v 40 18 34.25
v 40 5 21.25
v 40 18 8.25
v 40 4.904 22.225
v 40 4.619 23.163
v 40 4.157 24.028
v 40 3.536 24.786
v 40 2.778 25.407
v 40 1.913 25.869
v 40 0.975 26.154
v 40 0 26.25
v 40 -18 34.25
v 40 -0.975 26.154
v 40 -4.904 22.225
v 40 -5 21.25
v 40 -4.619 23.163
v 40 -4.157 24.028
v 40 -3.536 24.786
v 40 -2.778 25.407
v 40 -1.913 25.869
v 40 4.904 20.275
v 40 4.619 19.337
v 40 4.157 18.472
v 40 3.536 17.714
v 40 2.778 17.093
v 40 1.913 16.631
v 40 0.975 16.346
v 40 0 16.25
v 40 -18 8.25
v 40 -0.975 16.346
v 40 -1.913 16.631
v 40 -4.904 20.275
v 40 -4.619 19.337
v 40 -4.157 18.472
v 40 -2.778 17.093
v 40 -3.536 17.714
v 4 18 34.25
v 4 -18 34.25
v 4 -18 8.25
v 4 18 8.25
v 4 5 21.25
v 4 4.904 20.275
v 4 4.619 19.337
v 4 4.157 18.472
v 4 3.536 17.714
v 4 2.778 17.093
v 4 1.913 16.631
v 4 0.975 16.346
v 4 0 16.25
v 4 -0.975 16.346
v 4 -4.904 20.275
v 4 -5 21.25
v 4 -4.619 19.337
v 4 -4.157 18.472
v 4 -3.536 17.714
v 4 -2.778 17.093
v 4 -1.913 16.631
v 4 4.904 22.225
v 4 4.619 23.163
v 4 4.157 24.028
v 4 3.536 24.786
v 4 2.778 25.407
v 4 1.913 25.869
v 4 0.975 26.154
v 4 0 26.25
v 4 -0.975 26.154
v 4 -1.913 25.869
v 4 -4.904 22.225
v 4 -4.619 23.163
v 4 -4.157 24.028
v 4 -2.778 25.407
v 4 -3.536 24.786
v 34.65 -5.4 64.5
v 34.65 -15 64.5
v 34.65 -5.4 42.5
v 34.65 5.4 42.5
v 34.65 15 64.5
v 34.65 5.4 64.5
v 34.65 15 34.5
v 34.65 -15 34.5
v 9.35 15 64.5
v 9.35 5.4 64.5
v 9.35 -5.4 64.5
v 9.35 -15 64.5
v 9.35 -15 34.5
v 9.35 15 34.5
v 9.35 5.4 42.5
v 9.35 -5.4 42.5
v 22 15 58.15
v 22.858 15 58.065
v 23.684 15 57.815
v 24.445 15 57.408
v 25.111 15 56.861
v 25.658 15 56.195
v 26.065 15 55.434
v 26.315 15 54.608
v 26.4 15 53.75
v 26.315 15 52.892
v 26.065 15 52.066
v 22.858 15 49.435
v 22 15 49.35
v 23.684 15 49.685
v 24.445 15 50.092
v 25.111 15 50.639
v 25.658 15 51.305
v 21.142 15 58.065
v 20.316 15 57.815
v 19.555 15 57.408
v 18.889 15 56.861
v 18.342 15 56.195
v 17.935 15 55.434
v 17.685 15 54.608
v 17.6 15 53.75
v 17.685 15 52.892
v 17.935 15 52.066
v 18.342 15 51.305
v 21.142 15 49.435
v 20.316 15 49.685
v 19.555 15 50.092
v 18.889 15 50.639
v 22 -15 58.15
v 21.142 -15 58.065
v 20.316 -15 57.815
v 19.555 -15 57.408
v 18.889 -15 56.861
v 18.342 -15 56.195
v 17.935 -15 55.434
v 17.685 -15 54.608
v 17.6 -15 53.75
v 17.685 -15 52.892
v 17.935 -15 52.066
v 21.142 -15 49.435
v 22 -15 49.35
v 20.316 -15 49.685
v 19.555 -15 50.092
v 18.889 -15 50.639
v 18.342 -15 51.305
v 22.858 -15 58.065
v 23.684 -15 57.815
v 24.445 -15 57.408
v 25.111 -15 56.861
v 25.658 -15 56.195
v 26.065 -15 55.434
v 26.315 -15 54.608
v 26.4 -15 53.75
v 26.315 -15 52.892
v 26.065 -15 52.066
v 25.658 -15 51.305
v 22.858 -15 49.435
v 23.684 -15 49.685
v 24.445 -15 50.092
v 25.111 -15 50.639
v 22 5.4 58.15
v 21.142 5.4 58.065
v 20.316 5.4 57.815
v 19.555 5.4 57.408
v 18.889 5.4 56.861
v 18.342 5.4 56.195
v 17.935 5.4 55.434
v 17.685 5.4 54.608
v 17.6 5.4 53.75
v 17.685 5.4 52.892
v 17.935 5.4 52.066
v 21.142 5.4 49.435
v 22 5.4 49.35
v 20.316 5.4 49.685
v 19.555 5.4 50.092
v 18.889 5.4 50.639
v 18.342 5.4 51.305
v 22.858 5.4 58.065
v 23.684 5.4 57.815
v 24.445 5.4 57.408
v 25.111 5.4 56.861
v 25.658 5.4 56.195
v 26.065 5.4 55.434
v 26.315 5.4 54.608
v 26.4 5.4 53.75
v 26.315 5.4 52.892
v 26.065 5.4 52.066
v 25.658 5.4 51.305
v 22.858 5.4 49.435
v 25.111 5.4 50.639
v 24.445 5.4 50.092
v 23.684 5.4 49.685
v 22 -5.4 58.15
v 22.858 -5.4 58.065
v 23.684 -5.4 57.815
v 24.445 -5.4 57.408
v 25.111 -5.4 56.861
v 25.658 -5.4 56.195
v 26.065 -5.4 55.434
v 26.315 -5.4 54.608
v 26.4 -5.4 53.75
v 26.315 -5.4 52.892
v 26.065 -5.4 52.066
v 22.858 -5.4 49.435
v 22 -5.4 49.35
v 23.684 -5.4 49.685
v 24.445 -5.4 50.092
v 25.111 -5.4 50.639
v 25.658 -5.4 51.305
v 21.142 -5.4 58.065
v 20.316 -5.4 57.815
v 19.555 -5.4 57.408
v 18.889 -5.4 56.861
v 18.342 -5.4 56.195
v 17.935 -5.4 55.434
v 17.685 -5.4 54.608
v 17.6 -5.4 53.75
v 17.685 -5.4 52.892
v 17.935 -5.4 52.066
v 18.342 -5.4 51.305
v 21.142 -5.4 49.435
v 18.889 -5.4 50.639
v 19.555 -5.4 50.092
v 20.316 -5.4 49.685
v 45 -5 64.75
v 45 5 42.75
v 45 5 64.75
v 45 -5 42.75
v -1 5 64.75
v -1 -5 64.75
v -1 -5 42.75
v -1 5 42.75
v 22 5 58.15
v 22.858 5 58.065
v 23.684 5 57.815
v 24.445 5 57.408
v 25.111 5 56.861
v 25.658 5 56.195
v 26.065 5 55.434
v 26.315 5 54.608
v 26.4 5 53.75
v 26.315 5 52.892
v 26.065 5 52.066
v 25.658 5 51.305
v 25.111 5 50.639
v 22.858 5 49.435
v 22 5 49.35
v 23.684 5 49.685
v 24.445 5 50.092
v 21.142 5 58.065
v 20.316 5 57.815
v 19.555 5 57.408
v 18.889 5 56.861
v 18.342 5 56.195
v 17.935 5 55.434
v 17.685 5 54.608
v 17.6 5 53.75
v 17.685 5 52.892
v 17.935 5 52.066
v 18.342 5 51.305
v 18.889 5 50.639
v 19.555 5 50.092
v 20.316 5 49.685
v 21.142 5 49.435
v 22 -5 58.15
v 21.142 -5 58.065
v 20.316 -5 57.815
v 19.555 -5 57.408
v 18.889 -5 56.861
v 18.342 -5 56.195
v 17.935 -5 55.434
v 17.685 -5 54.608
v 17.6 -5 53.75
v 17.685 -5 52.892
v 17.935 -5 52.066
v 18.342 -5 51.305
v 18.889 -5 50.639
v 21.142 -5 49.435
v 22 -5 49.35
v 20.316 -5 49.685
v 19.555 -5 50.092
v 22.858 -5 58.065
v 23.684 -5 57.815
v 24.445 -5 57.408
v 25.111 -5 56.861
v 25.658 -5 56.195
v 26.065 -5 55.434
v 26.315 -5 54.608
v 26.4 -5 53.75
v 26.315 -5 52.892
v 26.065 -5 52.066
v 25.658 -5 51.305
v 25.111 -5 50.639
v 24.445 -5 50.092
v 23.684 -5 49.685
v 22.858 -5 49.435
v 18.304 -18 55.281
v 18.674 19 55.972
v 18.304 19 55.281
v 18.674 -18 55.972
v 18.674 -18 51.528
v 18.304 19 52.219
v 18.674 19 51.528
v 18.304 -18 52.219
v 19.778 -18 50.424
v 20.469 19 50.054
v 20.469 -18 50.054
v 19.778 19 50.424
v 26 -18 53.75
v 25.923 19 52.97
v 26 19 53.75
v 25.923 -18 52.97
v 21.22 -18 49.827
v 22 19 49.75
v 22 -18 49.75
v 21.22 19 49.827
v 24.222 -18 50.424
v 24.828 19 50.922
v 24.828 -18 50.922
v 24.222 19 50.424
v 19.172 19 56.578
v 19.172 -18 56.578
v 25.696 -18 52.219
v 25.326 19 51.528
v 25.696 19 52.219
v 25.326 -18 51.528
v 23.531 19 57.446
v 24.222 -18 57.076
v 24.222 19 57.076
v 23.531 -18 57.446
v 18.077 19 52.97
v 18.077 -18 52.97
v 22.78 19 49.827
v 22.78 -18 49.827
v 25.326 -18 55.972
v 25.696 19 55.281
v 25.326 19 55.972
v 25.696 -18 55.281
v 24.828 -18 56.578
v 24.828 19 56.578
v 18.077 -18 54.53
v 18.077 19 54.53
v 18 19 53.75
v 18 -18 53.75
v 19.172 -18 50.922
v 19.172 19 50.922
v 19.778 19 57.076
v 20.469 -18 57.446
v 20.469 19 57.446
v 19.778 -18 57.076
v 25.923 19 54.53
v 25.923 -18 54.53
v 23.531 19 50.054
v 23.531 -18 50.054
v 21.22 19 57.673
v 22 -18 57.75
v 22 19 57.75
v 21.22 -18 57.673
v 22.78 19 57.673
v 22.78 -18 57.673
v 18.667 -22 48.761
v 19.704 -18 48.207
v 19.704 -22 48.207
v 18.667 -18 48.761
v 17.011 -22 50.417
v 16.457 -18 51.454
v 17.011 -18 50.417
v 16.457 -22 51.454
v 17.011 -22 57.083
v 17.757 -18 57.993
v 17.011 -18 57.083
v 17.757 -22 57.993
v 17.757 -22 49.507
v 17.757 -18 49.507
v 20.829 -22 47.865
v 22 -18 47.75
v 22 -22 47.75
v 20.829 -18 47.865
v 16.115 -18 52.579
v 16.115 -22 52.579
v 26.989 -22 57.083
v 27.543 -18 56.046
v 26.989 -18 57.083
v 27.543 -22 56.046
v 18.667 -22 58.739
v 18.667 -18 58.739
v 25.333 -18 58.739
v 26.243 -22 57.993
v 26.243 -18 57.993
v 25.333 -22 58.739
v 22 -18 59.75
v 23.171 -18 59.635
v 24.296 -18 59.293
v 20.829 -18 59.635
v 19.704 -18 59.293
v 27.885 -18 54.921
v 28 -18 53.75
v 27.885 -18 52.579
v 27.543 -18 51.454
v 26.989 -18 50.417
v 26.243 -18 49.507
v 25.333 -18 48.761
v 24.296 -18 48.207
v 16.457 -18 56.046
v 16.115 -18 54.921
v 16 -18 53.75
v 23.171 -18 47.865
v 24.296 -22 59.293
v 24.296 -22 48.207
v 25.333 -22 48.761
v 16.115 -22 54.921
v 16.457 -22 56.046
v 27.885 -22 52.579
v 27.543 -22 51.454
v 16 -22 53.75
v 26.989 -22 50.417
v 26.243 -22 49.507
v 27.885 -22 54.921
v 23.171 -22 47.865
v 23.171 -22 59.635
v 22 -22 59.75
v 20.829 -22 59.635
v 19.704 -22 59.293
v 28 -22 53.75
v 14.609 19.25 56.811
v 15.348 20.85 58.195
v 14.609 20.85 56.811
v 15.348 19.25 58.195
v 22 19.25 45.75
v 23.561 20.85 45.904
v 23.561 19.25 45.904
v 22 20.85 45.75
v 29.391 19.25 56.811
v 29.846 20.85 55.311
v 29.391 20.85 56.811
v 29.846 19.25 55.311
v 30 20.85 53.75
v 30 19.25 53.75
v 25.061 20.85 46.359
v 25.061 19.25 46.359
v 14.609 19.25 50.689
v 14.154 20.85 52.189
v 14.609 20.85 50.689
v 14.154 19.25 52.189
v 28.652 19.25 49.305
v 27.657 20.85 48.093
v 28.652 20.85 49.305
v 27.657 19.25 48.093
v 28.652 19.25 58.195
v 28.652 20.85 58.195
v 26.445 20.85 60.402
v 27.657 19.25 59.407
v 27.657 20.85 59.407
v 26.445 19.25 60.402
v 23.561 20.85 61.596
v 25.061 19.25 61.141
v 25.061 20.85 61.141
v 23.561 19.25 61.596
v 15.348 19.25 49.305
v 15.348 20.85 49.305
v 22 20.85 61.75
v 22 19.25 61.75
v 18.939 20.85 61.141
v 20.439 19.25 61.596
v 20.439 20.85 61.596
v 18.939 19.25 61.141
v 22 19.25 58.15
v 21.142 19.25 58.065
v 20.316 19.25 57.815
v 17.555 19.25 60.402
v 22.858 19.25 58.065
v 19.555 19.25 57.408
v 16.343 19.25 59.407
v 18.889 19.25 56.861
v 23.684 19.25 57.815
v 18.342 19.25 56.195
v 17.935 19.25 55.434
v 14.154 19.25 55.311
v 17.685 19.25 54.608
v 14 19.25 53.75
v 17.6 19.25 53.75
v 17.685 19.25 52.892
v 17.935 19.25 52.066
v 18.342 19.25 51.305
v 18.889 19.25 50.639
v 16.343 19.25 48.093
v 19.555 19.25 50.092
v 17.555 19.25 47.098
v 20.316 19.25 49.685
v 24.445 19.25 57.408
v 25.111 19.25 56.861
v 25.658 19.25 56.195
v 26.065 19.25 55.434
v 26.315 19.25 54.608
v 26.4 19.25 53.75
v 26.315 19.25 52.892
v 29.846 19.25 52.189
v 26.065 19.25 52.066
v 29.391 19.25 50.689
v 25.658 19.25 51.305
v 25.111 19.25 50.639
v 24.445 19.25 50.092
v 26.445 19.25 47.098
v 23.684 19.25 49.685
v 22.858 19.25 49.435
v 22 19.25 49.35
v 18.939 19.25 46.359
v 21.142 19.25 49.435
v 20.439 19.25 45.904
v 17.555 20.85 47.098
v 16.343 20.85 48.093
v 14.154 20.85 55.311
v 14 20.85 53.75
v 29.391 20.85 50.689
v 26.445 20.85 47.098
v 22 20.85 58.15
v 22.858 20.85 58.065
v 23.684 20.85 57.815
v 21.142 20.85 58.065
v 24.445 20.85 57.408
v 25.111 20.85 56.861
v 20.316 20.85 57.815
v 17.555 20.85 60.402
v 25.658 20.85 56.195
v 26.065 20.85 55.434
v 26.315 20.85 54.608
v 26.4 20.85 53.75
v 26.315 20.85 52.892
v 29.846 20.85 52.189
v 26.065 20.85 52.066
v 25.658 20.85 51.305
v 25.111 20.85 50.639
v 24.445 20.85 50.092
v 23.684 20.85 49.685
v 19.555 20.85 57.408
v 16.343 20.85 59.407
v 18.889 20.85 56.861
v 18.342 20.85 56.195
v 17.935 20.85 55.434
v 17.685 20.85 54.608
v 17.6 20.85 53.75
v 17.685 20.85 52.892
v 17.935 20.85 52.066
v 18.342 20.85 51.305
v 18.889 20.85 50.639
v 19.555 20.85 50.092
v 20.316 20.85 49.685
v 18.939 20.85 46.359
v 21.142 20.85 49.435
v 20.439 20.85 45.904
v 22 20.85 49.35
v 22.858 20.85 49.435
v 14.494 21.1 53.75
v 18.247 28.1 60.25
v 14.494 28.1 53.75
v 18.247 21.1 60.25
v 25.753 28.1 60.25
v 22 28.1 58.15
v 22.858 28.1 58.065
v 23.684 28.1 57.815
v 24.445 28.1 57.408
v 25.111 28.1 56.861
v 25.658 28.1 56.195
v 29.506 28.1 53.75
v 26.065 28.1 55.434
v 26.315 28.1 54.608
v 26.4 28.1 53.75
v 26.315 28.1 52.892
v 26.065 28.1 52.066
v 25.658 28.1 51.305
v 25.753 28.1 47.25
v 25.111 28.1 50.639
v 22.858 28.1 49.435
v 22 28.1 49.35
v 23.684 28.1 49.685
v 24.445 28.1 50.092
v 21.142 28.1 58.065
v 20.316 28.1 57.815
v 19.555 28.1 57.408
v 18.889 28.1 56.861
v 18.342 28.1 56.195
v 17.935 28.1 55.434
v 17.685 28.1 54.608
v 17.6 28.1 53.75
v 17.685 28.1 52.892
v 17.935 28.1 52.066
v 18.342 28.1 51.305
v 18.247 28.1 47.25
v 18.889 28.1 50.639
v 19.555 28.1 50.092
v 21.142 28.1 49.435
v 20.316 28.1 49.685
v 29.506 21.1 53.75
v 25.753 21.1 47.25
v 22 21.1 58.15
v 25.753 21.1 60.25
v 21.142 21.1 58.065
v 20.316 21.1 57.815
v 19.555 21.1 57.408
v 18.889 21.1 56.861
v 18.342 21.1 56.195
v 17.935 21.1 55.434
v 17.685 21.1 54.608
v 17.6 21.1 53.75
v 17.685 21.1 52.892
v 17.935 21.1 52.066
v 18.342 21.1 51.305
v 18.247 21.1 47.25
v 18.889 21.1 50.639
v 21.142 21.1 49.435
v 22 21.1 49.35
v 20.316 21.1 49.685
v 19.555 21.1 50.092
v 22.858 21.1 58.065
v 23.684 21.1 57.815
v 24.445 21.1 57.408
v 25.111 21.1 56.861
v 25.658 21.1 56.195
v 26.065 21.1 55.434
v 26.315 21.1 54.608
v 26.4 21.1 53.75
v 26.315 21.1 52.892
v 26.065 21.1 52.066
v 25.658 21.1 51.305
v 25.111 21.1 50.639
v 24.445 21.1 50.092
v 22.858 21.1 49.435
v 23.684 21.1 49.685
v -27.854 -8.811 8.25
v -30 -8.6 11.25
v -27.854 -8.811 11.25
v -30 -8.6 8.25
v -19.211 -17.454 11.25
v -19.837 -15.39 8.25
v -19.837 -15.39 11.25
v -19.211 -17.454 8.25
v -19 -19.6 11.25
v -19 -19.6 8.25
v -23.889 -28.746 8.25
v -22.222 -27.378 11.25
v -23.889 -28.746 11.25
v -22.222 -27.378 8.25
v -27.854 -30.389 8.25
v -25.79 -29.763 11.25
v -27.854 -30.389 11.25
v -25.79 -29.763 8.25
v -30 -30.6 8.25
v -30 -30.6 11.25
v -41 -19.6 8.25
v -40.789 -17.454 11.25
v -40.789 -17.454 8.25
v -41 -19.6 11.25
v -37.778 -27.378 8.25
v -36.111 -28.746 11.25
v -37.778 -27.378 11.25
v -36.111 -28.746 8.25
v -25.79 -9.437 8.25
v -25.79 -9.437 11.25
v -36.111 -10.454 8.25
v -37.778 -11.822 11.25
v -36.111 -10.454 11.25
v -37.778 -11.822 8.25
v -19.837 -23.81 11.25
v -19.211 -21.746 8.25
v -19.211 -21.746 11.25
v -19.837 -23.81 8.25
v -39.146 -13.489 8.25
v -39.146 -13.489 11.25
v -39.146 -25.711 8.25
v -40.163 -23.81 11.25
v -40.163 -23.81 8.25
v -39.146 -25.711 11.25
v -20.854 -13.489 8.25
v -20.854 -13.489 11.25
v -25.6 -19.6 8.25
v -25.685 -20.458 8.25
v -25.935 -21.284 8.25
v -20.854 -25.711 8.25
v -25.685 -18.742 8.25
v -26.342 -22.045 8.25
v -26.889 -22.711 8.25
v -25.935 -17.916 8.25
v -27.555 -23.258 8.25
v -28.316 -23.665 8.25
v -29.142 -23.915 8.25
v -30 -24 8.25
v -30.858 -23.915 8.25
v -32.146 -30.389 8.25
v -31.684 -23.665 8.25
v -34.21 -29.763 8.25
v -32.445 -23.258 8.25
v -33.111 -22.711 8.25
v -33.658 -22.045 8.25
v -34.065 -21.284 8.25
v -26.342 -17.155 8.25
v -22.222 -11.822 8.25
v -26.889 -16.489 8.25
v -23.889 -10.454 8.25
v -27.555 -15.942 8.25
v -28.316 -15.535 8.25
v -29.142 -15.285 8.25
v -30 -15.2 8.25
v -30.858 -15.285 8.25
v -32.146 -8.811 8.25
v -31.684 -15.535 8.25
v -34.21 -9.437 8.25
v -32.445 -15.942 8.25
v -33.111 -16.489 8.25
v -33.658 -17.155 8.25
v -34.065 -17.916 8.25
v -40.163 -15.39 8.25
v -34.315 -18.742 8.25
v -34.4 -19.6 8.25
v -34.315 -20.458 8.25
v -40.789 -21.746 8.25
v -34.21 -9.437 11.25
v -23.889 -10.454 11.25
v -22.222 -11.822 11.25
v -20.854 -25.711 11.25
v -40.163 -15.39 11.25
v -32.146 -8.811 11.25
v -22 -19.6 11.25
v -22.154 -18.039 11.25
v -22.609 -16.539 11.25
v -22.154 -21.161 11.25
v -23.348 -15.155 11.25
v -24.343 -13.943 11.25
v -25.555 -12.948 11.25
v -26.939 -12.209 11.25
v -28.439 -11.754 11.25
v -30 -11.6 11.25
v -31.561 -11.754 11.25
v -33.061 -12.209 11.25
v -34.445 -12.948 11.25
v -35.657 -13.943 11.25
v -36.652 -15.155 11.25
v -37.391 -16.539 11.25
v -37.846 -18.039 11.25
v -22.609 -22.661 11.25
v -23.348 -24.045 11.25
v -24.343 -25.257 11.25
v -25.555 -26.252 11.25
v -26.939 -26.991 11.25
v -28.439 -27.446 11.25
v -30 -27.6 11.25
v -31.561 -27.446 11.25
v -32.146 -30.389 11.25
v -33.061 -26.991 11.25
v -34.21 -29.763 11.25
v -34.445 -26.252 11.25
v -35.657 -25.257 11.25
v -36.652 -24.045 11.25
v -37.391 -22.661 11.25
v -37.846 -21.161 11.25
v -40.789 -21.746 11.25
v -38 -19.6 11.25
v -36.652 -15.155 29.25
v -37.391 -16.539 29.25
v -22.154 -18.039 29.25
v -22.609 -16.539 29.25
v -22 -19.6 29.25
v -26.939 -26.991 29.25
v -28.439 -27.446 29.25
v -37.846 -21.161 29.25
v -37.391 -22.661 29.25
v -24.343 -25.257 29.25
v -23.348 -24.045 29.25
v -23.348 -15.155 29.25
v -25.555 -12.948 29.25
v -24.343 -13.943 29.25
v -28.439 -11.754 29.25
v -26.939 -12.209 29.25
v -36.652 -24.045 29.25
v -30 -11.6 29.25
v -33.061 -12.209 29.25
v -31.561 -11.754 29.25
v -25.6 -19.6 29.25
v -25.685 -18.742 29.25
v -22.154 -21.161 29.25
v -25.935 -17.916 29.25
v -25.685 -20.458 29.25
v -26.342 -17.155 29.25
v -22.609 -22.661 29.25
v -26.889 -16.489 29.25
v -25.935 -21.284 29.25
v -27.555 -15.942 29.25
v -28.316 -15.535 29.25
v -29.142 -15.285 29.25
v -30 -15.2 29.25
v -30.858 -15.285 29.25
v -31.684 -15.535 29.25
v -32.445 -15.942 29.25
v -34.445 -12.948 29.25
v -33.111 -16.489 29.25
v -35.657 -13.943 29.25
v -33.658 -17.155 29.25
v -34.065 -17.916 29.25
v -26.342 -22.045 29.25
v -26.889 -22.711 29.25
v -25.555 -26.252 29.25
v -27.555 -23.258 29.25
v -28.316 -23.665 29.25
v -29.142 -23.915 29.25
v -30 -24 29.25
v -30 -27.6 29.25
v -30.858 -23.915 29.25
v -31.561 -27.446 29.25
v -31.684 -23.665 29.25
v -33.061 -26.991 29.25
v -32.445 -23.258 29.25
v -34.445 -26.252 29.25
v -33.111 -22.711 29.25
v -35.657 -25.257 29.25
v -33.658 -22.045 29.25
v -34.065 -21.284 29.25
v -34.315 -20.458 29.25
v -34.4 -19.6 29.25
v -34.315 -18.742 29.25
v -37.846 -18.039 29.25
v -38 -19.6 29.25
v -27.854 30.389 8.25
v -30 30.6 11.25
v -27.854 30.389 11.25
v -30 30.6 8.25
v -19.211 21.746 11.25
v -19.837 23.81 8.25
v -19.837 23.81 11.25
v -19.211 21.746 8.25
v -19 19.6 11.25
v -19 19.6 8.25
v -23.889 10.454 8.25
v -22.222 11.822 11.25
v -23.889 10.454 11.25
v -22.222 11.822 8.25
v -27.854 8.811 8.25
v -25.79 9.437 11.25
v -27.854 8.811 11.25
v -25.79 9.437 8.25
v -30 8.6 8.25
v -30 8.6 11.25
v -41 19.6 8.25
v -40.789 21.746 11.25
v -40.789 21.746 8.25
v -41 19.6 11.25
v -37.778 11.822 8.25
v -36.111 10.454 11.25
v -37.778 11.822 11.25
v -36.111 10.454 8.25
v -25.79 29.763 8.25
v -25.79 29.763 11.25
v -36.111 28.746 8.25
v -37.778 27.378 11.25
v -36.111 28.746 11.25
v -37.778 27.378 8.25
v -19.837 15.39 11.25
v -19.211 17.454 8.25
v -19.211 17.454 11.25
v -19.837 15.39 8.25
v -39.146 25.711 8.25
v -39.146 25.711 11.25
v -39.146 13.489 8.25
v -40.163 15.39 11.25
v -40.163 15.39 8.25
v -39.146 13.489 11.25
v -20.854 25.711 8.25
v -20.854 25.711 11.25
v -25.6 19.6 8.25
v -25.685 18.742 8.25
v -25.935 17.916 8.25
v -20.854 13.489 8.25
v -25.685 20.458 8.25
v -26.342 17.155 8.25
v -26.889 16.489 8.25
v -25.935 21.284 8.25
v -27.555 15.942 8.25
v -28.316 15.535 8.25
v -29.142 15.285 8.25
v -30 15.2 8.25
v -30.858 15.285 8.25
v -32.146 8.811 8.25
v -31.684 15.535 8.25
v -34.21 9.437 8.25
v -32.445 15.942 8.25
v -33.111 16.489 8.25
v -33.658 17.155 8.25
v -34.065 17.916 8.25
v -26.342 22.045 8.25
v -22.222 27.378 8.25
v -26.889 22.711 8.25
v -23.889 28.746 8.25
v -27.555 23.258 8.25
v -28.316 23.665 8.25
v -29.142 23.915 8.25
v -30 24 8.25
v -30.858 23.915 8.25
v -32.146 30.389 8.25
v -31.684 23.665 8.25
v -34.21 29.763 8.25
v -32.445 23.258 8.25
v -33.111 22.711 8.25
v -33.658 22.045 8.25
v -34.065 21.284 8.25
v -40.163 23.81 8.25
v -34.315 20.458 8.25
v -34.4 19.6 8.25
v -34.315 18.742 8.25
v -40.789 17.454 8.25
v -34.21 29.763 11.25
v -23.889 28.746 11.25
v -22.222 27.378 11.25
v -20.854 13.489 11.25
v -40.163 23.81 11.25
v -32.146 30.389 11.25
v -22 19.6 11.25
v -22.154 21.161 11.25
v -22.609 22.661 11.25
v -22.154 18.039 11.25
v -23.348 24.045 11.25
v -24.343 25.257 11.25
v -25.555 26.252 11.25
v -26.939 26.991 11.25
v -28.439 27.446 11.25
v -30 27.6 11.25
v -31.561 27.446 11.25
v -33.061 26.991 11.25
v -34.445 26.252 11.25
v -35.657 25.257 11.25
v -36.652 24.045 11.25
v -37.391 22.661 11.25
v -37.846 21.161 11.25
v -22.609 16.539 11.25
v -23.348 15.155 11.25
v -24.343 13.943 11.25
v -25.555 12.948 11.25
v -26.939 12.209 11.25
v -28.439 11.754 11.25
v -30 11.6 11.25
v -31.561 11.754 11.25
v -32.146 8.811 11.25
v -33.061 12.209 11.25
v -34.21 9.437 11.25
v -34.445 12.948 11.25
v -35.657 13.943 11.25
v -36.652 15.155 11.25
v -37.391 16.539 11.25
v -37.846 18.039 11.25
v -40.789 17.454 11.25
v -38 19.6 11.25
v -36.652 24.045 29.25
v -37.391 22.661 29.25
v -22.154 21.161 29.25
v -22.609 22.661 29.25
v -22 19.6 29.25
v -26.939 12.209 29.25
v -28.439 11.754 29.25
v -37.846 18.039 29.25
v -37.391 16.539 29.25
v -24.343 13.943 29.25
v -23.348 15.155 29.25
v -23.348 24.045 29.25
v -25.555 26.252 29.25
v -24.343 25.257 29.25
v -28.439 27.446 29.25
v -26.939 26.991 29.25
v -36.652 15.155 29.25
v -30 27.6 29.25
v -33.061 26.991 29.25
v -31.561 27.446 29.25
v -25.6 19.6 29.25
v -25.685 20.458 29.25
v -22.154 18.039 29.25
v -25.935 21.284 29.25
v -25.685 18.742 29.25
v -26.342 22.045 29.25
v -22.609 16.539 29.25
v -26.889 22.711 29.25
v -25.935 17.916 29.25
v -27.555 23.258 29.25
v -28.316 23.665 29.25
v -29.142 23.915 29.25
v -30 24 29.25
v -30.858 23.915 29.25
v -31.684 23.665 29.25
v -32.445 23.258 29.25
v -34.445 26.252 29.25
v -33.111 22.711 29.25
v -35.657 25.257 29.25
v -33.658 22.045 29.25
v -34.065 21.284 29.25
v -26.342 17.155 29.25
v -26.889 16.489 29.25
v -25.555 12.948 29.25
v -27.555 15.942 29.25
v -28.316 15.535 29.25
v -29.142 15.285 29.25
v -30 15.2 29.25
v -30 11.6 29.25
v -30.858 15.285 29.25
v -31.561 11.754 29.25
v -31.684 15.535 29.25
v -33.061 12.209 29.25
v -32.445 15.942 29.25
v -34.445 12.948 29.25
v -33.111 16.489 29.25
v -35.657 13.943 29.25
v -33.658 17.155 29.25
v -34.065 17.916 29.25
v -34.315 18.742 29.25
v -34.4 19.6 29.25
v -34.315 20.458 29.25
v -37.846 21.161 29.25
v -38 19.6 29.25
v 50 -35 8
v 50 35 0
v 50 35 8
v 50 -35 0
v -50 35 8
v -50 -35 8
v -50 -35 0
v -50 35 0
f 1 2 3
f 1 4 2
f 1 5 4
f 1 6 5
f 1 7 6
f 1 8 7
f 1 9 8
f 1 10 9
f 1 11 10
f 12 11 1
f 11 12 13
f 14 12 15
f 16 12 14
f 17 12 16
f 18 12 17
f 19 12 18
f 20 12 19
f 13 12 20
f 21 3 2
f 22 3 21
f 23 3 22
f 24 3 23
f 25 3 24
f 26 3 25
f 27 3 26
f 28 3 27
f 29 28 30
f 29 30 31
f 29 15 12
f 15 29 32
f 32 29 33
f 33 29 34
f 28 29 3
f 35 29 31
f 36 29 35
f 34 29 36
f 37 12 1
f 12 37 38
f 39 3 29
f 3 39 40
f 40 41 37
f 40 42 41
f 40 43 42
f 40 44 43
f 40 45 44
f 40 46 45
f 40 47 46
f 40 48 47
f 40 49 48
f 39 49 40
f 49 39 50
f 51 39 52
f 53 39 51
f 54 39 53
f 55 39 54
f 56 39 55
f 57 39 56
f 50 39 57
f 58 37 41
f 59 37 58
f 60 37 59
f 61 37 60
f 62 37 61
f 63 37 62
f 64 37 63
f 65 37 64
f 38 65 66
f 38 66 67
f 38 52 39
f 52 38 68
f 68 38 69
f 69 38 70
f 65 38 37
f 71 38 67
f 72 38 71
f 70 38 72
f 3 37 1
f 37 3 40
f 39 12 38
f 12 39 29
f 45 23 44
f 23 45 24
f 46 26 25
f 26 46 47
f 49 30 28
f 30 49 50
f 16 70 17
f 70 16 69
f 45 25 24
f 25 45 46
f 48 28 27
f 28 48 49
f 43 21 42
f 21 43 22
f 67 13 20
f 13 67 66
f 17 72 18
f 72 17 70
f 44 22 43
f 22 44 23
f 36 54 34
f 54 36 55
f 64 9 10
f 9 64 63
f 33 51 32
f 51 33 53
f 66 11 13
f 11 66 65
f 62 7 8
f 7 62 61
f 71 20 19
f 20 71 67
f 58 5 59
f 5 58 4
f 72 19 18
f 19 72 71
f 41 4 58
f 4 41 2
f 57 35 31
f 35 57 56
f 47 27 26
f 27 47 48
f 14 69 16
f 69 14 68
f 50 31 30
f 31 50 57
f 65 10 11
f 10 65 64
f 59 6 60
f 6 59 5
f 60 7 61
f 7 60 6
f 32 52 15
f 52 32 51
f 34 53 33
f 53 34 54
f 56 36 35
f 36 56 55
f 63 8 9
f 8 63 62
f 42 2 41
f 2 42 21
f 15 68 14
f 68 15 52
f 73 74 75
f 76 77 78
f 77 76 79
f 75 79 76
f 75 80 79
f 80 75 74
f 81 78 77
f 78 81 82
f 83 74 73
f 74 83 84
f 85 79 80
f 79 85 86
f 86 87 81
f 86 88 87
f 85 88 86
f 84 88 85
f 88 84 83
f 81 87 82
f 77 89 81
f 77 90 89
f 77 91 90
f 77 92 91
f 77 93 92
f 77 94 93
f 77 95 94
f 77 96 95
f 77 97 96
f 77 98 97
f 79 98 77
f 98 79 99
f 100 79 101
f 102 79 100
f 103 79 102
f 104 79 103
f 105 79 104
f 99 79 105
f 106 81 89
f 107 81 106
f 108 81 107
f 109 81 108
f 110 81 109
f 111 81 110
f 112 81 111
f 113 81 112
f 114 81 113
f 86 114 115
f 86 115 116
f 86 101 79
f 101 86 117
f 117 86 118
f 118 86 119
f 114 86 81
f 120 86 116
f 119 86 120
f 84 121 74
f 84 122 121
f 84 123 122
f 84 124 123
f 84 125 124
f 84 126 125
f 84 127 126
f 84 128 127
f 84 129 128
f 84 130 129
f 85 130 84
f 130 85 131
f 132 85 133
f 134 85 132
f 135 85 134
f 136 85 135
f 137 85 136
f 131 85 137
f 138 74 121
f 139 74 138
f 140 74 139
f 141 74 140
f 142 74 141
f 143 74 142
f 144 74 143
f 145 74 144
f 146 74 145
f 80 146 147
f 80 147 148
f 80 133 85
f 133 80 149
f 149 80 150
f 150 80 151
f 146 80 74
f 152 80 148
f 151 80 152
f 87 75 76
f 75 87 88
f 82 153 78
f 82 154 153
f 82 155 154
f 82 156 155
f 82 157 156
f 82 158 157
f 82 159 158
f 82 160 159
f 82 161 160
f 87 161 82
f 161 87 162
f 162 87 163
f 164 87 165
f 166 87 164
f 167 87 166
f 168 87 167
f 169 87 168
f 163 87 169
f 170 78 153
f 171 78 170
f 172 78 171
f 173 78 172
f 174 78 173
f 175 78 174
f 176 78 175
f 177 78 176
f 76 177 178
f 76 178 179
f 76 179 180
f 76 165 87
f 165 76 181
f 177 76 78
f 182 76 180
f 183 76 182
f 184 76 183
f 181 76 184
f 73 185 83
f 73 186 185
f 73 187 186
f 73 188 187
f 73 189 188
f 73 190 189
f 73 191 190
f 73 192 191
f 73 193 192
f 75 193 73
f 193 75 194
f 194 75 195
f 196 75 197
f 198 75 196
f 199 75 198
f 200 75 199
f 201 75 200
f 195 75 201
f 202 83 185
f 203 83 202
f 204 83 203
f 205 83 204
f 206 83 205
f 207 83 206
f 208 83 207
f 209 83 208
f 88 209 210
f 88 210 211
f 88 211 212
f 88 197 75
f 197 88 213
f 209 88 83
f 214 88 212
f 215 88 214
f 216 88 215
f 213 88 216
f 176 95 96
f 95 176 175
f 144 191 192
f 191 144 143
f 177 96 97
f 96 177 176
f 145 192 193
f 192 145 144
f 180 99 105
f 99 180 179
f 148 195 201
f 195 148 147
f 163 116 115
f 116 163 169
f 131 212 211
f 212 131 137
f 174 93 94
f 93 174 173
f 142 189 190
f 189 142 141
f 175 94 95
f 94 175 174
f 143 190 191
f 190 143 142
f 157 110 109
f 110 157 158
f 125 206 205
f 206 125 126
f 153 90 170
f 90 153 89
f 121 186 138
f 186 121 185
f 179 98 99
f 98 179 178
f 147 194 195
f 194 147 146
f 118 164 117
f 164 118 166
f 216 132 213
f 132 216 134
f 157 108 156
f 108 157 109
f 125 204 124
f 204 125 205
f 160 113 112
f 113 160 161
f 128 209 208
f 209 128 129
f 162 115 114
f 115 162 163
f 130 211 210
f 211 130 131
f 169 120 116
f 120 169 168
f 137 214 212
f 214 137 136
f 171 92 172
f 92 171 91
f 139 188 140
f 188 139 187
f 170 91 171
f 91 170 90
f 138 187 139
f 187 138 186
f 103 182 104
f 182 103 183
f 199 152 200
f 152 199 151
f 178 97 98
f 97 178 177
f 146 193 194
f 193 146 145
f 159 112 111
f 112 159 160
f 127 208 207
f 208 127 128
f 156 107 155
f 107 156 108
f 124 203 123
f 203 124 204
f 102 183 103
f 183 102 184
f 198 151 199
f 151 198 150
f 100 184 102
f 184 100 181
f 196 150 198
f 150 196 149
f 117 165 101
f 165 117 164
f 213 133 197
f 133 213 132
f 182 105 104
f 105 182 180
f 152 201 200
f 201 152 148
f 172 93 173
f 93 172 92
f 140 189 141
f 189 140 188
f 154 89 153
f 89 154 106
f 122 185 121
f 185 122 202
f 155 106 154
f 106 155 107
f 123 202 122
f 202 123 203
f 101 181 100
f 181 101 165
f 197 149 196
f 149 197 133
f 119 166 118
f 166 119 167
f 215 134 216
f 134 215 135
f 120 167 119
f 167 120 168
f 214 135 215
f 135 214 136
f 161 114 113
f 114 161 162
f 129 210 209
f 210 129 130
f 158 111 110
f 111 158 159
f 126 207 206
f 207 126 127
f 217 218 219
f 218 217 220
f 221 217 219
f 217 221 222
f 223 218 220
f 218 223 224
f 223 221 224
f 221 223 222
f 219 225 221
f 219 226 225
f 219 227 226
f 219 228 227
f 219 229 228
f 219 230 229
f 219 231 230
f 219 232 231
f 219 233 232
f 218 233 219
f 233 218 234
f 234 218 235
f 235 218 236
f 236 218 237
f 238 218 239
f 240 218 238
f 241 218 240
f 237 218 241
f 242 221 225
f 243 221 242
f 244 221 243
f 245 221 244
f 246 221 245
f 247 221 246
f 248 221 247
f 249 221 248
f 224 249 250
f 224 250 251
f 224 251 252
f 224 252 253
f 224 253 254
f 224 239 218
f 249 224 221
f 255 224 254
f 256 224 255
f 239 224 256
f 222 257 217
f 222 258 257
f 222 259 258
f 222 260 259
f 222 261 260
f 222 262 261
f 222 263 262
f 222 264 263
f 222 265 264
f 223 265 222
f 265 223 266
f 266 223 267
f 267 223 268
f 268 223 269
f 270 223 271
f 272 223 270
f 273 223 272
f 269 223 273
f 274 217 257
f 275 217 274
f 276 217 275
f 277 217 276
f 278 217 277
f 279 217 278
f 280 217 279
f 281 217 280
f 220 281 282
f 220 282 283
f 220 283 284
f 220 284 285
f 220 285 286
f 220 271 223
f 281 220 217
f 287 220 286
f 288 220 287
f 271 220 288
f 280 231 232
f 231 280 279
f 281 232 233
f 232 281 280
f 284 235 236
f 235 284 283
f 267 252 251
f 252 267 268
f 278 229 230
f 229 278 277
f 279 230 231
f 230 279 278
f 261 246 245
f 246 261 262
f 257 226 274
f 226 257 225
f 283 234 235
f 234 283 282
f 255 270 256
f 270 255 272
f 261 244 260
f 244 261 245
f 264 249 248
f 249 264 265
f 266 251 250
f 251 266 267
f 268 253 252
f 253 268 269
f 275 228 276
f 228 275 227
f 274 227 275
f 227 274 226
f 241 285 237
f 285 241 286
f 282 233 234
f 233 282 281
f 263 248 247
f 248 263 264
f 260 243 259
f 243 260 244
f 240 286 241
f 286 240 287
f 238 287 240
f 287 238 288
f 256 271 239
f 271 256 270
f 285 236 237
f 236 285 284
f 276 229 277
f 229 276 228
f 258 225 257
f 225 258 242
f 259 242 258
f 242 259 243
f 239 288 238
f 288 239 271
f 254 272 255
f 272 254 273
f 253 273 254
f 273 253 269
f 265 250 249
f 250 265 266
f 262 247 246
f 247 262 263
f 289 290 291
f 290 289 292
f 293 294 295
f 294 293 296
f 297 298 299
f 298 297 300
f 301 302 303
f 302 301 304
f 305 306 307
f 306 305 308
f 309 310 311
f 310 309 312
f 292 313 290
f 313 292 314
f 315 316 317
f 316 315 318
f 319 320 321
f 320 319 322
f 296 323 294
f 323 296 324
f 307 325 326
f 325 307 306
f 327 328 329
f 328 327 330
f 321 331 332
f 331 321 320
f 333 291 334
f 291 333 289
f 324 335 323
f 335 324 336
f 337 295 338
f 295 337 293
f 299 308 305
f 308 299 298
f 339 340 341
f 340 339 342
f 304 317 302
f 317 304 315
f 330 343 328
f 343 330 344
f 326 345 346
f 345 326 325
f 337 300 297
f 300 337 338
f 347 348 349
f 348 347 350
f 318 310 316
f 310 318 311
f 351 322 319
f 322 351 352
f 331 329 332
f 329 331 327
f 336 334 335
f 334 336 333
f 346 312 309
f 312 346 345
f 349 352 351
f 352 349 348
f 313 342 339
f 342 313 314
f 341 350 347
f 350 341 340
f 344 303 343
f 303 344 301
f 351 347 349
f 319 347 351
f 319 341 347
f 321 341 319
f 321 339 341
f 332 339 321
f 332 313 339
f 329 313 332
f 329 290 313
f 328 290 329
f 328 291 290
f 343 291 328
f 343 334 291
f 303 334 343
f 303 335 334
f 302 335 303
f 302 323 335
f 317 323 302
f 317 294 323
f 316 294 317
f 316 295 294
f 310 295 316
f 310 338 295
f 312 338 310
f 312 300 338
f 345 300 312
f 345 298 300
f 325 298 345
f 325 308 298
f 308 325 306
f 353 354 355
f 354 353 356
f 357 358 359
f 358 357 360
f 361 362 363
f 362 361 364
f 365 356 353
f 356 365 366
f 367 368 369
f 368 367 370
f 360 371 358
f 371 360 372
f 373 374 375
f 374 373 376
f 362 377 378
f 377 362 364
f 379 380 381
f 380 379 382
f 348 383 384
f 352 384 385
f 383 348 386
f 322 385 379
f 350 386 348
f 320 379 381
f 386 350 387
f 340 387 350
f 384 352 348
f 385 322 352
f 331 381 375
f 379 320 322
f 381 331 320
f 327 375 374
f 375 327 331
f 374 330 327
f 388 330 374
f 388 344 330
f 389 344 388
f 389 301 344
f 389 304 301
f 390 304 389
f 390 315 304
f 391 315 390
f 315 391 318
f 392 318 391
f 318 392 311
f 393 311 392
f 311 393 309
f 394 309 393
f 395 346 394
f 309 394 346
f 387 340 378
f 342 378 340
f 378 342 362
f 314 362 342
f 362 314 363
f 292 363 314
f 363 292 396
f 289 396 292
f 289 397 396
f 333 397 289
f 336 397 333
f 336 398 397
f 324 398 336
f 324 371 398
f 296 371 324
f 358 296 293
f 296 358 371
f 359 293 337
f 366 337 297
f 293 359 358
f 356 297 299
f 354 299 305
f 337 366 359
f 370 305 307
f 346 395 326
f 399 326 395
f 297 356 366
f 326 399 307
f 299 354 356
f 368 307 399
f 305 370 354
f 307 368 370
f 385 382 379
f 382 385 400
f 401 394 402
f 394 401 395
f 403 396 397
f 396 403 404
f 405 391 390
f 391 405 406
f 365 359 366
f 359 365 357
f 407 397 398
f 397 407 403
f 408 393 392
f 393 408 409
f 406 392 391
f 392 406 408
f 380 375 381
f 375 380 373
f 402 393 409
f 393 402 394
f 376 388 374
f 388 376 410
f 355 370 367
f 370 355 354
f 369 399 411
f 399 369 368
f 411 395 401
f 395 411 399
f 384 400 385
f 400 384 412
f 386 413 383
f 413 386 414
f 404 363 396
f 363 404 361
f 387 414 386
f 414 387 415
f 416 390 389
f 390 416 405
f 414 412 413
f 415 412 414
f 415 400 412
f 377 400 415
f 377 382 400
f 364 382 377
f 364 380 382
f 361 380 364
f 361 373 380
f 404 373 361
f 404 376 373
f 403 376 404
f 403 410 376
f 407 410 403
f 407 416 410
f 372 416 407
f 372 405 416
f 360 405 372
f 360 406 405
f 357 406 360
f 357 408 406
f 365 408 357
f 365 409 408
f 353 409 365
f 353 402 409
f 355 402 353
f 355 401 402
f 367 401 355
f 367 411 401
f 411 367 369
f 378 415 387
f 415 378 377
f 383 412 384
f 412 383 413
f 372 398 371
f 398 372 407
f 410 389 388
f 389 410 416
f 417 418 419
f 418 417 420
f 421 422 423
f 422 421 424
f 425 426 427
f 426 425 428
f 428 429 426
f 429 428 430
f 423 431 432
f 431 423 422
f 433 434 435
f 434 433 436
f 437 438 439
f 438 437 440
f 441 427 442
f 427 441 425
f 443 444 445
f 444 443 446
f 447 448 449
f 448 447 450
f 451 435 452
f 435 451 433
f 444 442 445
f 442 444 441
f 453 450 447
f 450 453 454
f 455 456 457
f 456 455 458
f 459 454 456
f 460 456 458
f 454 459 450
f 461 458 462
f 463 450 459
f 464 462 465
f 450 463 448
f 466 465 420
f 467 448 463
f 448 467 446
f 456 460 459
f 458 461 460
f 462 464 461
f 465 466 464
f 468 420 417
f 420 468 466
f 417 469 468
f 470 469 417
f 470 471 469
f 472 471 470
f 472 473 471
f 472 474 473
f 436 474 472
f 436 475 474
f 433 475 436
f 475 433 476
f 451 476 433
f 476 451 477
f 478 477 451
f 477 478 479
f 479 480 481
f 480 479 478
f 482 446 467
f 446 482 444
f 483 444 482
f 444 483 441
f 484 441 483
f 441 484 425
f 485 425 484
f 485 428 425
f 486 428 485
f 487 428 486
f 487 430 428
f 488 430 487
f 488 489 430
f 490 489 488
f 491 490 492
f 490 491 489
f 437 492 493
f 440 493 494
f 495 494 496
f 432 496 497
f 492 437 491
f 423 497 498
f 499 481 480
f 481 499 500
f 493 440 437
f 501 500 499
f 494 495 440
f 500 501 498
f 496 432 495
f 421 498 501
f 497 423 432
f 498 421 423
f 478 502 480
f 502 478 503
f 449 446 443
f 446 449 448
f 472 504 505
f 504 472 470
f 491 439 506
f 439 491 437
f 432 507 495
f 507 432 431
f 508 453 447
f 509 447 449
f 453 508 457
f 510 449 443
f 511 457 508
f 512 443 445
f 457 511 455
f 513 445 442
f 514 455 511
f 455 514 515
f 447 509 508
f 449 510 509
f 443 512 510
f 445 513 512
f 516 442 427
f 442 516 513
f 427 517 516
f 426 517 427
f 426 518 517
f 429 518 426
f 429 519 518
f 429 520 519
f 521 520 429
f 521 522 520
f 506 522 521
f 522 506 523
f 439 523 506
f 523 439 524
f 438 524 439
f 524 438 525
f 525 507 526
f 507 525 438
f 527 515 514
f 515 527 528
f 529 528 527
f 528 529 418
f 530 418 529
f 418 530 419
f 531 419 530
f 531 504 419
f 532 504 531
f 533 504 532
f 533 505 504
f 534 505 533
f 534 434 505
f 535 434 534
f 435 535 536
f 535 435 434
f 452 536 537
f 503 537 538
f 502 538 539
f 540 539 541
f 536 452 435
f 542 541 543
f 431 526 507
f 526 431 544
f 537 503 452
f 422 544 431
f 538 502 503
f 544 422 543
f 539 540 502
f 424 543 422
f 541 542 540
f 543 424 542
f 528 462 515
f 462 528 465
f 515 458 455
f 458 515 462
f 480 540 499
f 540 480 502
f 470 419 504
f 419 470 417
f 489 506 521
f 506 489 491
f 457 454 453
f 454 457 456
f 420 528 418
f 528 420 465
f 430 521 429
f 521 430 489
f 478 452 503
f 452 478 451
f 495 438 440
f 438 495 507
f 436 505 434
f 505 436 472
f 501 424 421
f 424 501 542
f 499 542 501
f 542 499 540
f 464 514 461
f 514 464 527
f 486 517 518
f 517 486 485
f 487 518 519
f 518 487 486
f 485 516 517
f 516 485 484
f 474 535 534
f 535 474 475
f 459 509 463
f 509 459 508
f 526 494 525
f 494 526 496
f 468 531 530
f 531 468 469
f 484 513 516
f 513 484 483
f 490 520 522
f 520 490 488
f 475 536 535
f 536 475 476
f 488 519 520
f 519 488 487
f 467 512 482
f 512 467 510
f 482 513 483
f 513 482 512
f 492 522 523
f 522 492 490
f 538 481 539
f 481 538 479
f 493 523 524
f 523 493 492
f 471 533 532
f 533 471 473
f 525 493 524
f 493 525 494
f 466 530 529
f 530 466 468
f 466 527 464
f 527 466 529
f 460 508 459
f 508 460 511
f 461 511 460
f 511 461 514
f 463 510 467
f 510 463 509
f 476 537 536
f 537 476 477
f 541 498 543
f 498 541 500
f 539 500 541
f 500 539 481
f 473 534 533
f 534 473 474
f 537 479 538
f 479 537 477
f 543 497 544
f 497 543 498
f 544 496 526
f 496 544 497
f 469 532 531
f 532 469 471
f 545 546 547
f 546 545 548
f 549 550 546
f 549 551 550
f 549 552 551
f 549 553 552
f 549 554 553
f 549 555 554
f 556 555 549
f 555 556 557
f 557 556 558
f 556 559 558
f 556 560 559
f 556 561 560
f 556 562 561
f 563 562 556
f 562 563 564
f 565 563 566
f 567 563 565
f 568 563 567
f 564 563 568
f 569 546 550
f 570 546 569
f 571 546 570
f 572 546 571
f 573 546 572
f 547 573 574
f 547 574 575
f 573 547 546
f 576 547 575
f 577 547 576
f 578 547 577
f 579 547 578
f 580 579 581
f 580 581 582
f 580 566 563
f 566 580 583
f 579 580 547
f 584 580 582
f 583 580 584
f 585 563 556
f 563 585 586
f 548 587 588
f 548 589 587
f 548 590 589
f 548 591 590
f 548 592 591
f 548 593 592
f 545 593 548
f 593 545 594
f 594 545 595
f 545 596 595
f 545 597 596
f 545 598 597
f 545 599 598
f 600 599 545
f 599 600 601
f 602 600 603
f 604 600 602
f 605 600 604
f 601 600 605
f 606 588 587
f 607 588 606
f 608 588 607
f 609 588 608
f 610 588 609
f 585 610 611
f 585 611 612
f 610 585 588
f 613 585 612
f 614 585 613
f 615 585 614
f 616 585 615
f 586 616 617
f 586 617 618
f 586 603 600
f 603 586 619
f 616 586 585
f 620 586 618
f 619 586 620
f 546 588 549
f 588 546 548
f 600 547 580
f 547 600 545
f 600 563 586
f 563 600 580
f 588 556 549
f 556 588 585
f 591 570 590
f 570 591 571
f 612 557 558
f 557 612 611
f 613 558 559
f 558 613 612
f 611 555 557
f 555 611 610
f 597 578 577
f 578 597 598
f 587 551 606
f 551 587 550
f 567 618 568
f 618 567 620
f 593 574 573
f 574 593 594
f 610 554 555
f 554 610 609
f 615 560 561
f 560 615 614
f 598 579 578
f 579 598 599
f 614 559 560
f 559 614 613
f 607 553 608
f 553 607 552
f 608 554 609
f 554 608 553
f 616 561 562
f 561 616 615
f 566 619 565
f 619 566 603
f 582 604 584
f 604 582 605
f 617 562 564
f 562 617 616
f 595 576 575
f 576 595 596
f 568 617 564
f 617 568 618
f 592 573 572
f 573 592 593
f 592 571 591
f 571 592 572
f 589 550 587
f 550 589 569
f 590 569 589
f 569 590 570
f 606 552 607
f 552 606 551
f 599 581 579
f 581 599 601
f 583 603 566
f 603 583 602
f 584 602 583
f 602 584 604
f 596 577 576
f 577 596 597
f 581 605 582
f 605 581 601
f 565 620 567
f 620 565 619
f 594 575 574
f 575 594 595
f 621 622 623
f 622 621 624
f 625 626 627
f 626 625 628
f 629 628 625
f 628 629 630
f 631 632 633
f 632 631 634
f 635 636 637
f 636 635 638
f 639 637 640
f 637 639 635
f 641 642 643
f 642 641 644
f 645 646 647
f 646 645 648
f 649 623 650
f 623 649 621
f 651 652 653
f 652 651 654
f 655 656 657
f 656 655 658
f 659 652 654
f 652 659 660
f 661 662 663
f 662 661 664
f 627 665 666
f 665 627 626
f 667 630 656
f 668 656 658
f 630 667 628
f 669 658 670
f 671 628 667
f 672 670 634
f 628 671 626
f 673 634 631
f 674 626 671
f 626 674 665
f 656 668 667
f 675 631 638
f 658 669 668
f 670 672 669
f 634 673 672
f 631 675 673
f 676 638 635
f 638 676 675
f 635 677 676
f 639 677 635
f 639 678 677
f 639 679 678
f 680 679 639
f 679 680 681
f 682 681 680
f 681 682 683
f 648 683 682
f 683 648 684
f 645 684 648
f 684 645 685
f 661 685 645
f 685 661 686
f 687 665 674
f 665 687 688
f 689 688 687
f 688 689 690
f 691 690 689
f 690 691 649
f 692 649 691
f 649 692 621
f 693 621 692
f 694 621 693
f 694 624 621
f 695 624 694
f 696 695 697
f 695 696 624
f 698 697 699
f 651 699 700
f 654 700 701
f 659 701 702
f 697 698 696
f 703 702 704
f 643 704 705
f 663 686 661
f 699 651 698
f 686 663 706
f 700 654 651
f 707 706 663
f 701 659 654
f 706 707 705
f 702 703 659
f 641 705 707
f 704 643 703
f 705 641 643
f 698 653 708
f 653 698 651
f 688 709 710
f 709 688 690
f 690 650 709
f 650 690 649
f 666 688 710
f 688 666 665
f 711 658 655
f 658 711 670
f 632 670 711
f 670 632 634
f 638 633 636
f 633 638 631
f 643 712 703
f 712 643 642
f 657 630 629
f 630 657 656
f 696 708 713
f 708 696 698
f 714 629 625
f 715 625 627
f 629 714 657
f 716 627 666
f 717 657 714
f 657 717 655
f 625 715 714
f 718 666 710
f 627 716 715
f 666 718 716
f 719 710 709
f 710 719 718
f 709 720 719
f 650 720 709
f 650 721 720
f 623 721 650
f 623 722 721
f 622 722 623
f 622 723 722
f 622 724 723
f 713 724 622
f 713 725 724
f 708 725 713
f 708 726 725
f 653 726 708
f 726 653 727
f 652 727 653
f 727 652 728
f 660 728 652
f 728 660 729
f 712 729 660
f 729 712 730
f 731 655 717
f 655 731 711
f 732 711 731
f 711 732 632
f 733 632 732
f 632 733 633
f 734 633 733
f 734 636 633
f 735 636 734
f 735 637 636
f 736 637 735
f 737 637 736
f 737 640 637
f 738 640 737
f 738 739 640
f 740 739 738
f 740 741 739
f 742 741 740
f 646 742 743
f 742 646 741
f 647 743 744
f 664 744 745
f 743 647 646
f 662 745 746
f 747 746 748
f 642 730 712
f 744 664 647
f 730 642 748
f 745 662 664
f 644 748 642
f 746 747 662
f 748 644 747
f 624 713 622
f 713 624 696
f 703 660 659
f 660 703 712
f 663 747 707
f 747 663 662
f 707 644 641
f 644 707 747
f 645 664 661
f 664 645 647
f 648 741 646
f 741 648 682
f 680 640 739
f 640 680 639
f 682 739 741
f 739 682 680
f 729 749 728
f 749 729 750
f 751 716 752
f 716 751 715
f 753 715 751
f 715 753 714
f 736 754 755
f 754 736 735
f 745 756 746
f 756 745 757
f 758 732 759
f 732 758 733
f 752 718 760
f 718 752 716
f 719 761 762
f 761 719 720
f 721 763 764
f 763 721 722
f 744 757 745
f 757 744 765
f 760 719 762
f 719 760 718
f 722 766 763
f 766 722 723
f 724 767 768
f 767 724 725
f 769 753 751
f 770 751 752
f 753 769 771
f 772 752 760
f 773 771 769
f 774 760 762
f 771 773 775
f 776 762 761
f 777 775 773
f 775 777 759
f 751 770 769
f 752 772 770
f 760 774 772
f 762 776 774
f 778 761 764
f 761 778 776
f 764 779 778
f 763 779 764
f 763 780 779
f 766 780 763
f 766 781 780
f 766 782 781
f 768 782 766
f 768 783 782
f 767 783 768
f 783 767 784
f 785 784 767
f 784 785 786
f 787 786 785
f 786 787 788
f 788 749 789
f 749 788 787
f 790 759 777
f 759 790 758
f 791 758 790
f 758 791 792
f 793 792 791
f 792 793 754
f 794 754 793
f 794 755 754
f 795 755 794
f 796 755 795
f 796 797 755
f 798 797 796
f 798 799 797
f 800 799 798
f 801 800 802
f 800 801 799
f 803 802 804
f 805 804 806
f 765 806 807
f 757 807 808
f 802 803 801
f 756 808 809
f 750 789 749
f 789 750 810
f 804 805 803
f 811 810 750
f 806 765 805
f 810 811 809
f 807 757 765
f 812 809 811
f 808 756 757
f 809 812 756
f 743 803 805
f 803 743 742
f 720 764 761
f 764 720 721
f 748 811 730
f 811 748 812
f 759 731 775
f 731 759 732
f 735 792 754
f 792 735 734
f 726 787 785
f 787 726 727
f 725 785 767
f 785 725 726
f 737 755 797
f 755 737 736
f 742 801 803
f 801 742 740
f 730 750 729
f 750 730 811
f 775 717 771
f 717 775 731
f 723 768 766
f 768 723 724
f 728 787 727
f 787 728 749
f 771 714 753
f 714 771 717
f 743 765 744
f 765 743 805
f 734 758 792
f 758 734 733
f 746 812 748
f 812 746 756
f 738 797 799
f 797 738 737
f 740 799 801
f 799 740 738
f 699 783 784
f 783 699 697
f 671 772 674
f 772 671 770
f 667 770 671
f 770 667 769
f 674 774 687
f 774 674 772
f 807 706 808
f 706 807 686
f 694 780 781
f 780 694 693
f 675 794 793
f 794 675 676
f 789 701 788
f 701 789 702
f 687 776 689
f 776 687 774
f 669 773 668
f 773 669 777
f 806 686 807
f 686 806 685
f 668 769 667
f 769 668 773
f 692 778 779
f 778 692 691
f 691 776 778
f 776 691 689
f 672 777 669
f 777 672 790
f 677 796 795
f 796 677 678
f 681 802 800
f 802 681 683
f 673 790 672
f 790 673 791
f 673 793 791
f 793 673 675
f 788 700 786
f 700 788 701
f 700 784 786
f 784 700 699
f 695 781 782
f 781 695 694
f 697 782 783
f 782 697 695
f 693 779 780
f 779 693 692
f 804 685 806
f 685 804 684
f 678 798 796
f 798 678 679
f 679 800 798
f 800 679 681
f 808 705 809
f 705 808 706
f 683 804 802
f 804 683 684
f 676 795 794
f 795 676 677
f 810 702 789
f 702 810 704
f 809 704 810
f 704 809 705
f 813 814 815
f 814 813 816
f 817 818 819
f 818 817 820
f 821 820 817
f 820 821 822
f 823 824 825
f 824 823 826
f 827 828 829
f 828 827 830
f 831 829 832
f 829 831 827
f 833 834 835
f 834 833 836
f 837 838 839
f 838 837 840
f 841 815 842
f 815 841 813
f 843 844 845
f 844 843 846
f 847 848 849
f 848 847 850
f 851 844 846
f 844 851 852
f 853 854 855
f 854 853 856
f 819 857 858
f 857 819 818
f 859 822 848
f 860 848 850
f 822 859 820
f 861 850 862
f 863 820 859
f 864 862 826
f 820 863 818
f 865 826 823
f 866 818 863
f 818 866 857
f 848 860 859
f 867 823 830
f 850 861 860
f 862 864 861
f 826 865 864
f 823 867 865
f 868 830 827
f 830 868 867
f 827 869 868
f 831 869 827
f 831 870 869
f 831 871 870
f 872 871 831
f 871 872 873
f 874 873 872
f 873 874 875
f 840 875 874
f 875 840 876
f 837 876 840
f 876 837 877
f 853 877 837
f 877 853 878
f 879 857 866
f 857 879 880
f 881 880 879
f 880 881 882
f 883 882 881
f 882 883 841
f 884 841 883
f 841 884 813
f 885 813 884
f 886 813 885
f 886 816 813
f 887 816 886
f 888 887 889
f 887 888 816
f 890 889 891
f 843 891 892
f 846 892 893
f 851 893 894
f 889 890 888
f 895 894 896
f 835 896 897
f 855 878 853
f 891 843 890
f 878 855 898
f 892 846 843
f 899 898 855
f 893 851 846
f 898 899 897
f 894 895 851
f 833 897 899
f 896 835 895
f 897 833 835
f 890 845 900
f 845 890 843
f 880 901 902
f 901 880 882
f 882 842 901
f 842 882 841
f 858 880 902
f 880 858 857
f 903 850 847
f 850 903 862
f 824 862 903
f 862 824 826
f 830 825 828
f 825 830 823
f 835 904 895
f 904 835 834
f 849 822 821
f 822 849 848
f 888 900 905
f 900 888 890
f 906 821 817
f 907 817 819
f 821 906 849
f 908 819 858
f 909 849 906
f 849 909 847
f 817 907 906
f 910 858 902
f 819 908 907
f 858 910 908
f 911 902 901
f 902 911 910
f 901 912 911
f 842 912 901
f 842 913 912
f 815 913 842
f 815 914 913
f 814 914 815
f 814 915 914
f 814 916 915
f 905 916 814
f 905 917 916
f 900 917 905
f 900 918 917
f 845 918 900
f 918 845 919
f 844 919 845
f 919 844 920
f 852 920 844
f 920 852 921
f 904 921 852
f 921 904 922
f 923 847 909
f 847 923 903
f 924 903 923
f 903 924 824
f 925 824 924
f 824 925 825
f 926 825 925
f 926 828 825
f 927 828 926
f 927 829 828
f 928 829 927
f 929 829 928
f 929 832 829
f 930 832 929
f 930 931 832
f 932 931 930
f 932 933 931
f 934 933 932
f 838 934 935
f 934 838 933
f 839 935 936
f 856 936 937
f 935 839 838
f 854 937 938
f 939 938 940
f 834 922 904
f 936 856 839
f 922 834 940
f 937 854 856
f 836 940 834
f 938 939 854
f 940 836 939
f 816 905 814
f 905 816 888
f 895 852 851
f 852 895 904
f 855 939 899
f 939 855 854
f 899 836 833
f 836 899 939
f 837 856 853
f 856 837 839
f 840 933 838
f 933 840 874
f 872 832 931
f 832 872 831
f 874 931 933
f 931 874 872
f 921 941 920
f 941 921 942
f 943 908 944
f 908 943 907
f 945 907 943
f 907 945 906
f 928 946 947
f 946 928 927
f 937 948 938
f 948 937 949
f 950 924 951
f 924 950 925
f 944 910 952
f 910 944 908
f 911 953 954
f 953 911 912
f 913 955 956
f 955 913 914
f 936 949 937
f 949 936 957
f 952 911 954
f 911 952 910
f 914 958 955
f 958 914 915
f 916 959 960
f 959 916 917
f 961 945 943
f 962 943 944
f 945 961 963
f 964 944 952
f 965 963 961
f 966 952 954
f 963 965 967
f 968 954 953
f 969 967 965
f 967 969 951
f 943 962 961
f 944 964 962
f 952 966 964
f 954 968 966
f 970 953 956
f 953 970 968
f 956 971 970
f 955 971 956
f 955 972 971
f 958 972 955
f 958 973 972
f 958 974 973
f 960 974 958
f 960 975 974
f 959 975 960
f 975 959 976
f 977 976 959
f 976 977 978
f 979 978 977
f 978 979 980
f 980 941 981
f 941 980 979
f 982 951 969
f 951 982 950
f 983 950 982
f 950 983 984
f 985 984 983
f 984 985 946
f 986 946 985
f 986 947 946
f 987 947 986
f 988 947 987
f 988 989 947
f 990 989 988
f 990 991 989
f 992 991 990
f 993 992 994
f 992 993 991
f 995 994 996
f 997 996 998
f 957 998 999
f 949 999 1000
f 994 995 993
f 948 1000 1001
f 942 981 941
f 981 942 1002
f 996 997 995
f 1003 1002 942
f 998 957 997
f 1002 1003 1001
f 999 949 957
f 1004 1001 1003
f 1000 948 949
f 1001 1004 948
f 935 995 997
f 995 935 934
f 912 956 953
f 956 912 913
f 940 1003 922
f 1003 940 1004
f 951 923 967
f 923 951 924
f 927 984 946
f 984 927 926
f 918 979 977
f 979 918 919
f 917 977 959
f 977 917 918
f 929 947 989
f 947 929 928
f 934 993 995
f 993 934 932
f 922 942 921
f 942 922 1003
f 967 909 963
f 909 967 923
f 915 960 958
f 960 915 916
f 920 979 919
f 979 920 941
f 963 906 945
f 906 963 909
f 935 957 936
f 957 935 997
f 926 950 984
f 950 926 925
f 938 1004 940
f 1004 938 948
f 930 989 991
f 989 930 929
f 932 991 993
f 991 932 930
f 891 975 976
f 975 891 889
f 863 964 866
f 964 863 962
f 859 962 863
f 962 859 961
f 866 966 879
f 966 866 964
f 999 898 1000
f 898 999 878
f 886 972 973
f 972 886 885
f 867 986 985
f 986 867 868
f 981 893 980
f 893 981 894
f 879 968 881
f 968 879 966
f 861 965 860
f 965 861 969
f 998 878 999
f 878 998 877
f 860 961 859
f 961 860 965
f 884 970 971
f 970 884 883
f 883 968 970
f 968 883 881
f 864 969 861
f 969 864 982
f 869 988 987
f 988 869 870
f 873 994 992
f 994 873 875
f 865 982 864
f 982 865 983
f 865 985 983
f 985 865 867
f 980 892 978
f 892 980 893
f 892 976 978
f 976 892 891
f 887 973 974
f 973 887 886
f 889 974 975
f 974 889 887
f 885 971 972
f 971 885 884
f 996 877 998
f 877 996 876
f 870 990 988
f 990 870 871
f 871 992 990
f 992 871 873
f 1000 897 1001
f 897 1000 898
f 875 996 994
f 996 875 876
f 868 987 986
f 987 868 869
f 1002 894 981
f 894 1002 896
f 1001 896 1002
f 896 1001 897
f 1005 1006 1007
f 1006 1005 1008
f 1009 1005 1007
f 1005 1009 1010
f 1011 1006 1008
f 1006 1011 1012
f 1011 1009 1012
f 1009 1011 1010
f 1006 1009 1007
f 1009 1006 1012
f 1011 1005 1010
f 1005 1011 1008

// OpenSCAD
$fn = 32;

// ------------------------------------------------------------------------
// Indexing jig: plate 100 x 70 mm, pin d8
// Every part is its own module, assembly() places every instance.
// ------------------------------------------------------------------------

// --- part 1 ---
module jig_plate() {
  difference() {
    translate([-50, -35, 0]) cube([100, 70, 8]);
  }
}

// --- part 2 ---
module locator_block() {
  difference() {
    translate([-18, -18, 0]) cube([36, 36, 26]);
    translate([0, 0, 13]) rotate([0, 90, 0]) cylinder(h = 38, d = 10, center = true);
  }
}

// --- part 3 ---
module index_fork() {
  difference() {
    translate([-12.65, -15, 0]) cube([25.3, 30, 30]);
    translate([-13.65, -5.4, 8]) cube([27.3, 10.8, 23]);
    translate([0, 0, 19.25]) rotate([90, 0, 0]) cylinder(h = 32, d = 8.8, center = true);
  }
}

// --- part 4 ---
module index_arm() {
  difference() {
    translate([-23, -5, 0]) cube([46, 10, 22]);
    translate([0, 0, 11]) rotate([90, 0, 0]) cylinder(h = 12, d = 8.8, center = true);
  }
}

// --- part 5 ---
module index_pin() {
  rotate([0, 90, 0]) cylinder(h = 38, d = 8, center = true);
  translate([-22, 0, 0]) rotate([0, 90, 0]) cylinder(h = 4, d = 12);
}

// --- part 6 ---
module pin_washer() {
  difference() {
      translate([0, 0, 0]) cylinder(h = 1.6, d = 16);
      translate([0, 0, -1]) cylinder(h = 3.6, d = 8.8);
    }
}

// --- part 7 ---
module lock_nut() {
  difference() {
    linear_extrude(height = 7) polygon(points = [[7.506, 0], [3.753, 6.5], [-3.753, 6.5], [-7.506, 0], [-3.753, -6.5], [3.753, -6.5]]);
    translate([0, 0, -1]) cylinder(h = 9, d = 8.8);
  }
}

// --- part 8 ---
module guide_bush_a() {
  difference() {
    union() {
      cylinder(h = 3, d = 22);
      translate([0, 0, 3]) cylinder(h = 18, d = 16);
    }
    translate([0, 0, -1]) cylinder(h = 23, d = 8.8);
  }
}

// --- part 9 ---
module guide_bush_b() {
  difference() {
    union() {
      cylinder(h = 3, d = 22);
      translate([0, 0, 3]) cylinder(h = 18, d = 16);
    }
    translate([0, 0, -1]) cylinder(h = 23, d = 8.8);
  }
}

// --- assembly ---
module assembly() {
  color([0.80, 0.24, 0.20]) translate([0, 0, 0]) rotate([0, 0, 0]) jig_plate();
  color([0.20, 0.45, 0.75]) translate([22, 0, 8.25]) rotate([0, 0, 0]) locator_block();
  color([0.25, 0.62, 0.32]) translate([22, 0, 34.5]) rotate([0, 0, 0]) index_fork();
  color([0.92, 0.70, 0.18]) translate([22, 0, 42.75]) rotate([0, 0, 0]) index_arm();
  color([0.58, 0.35, 0.70]) translate([22, 0, 53.75]) rotate([0, 0, 90]) index_pin();
  color([0.16, 0.66, 0.66]) translate([22, 20.85, 53.75]) rotate([90, 0, 0]) pin_washer();
  color([0.85, 0.48, 0.18]) translate([22, 28.1, 53.75]) rotate([90, 0, 0]) lock_nut();
  color([0.55, 0.60, 0.65]) translate([-30, -19.6, 8.25]) rotate([0, 0, 0]) guide_bush_a();
  color([0.75, 0.30, 0.55]) translate([-30, 19.6, 8.25]) rotate([0, 0, 0]) guide_bush_b();
}

assembly();
